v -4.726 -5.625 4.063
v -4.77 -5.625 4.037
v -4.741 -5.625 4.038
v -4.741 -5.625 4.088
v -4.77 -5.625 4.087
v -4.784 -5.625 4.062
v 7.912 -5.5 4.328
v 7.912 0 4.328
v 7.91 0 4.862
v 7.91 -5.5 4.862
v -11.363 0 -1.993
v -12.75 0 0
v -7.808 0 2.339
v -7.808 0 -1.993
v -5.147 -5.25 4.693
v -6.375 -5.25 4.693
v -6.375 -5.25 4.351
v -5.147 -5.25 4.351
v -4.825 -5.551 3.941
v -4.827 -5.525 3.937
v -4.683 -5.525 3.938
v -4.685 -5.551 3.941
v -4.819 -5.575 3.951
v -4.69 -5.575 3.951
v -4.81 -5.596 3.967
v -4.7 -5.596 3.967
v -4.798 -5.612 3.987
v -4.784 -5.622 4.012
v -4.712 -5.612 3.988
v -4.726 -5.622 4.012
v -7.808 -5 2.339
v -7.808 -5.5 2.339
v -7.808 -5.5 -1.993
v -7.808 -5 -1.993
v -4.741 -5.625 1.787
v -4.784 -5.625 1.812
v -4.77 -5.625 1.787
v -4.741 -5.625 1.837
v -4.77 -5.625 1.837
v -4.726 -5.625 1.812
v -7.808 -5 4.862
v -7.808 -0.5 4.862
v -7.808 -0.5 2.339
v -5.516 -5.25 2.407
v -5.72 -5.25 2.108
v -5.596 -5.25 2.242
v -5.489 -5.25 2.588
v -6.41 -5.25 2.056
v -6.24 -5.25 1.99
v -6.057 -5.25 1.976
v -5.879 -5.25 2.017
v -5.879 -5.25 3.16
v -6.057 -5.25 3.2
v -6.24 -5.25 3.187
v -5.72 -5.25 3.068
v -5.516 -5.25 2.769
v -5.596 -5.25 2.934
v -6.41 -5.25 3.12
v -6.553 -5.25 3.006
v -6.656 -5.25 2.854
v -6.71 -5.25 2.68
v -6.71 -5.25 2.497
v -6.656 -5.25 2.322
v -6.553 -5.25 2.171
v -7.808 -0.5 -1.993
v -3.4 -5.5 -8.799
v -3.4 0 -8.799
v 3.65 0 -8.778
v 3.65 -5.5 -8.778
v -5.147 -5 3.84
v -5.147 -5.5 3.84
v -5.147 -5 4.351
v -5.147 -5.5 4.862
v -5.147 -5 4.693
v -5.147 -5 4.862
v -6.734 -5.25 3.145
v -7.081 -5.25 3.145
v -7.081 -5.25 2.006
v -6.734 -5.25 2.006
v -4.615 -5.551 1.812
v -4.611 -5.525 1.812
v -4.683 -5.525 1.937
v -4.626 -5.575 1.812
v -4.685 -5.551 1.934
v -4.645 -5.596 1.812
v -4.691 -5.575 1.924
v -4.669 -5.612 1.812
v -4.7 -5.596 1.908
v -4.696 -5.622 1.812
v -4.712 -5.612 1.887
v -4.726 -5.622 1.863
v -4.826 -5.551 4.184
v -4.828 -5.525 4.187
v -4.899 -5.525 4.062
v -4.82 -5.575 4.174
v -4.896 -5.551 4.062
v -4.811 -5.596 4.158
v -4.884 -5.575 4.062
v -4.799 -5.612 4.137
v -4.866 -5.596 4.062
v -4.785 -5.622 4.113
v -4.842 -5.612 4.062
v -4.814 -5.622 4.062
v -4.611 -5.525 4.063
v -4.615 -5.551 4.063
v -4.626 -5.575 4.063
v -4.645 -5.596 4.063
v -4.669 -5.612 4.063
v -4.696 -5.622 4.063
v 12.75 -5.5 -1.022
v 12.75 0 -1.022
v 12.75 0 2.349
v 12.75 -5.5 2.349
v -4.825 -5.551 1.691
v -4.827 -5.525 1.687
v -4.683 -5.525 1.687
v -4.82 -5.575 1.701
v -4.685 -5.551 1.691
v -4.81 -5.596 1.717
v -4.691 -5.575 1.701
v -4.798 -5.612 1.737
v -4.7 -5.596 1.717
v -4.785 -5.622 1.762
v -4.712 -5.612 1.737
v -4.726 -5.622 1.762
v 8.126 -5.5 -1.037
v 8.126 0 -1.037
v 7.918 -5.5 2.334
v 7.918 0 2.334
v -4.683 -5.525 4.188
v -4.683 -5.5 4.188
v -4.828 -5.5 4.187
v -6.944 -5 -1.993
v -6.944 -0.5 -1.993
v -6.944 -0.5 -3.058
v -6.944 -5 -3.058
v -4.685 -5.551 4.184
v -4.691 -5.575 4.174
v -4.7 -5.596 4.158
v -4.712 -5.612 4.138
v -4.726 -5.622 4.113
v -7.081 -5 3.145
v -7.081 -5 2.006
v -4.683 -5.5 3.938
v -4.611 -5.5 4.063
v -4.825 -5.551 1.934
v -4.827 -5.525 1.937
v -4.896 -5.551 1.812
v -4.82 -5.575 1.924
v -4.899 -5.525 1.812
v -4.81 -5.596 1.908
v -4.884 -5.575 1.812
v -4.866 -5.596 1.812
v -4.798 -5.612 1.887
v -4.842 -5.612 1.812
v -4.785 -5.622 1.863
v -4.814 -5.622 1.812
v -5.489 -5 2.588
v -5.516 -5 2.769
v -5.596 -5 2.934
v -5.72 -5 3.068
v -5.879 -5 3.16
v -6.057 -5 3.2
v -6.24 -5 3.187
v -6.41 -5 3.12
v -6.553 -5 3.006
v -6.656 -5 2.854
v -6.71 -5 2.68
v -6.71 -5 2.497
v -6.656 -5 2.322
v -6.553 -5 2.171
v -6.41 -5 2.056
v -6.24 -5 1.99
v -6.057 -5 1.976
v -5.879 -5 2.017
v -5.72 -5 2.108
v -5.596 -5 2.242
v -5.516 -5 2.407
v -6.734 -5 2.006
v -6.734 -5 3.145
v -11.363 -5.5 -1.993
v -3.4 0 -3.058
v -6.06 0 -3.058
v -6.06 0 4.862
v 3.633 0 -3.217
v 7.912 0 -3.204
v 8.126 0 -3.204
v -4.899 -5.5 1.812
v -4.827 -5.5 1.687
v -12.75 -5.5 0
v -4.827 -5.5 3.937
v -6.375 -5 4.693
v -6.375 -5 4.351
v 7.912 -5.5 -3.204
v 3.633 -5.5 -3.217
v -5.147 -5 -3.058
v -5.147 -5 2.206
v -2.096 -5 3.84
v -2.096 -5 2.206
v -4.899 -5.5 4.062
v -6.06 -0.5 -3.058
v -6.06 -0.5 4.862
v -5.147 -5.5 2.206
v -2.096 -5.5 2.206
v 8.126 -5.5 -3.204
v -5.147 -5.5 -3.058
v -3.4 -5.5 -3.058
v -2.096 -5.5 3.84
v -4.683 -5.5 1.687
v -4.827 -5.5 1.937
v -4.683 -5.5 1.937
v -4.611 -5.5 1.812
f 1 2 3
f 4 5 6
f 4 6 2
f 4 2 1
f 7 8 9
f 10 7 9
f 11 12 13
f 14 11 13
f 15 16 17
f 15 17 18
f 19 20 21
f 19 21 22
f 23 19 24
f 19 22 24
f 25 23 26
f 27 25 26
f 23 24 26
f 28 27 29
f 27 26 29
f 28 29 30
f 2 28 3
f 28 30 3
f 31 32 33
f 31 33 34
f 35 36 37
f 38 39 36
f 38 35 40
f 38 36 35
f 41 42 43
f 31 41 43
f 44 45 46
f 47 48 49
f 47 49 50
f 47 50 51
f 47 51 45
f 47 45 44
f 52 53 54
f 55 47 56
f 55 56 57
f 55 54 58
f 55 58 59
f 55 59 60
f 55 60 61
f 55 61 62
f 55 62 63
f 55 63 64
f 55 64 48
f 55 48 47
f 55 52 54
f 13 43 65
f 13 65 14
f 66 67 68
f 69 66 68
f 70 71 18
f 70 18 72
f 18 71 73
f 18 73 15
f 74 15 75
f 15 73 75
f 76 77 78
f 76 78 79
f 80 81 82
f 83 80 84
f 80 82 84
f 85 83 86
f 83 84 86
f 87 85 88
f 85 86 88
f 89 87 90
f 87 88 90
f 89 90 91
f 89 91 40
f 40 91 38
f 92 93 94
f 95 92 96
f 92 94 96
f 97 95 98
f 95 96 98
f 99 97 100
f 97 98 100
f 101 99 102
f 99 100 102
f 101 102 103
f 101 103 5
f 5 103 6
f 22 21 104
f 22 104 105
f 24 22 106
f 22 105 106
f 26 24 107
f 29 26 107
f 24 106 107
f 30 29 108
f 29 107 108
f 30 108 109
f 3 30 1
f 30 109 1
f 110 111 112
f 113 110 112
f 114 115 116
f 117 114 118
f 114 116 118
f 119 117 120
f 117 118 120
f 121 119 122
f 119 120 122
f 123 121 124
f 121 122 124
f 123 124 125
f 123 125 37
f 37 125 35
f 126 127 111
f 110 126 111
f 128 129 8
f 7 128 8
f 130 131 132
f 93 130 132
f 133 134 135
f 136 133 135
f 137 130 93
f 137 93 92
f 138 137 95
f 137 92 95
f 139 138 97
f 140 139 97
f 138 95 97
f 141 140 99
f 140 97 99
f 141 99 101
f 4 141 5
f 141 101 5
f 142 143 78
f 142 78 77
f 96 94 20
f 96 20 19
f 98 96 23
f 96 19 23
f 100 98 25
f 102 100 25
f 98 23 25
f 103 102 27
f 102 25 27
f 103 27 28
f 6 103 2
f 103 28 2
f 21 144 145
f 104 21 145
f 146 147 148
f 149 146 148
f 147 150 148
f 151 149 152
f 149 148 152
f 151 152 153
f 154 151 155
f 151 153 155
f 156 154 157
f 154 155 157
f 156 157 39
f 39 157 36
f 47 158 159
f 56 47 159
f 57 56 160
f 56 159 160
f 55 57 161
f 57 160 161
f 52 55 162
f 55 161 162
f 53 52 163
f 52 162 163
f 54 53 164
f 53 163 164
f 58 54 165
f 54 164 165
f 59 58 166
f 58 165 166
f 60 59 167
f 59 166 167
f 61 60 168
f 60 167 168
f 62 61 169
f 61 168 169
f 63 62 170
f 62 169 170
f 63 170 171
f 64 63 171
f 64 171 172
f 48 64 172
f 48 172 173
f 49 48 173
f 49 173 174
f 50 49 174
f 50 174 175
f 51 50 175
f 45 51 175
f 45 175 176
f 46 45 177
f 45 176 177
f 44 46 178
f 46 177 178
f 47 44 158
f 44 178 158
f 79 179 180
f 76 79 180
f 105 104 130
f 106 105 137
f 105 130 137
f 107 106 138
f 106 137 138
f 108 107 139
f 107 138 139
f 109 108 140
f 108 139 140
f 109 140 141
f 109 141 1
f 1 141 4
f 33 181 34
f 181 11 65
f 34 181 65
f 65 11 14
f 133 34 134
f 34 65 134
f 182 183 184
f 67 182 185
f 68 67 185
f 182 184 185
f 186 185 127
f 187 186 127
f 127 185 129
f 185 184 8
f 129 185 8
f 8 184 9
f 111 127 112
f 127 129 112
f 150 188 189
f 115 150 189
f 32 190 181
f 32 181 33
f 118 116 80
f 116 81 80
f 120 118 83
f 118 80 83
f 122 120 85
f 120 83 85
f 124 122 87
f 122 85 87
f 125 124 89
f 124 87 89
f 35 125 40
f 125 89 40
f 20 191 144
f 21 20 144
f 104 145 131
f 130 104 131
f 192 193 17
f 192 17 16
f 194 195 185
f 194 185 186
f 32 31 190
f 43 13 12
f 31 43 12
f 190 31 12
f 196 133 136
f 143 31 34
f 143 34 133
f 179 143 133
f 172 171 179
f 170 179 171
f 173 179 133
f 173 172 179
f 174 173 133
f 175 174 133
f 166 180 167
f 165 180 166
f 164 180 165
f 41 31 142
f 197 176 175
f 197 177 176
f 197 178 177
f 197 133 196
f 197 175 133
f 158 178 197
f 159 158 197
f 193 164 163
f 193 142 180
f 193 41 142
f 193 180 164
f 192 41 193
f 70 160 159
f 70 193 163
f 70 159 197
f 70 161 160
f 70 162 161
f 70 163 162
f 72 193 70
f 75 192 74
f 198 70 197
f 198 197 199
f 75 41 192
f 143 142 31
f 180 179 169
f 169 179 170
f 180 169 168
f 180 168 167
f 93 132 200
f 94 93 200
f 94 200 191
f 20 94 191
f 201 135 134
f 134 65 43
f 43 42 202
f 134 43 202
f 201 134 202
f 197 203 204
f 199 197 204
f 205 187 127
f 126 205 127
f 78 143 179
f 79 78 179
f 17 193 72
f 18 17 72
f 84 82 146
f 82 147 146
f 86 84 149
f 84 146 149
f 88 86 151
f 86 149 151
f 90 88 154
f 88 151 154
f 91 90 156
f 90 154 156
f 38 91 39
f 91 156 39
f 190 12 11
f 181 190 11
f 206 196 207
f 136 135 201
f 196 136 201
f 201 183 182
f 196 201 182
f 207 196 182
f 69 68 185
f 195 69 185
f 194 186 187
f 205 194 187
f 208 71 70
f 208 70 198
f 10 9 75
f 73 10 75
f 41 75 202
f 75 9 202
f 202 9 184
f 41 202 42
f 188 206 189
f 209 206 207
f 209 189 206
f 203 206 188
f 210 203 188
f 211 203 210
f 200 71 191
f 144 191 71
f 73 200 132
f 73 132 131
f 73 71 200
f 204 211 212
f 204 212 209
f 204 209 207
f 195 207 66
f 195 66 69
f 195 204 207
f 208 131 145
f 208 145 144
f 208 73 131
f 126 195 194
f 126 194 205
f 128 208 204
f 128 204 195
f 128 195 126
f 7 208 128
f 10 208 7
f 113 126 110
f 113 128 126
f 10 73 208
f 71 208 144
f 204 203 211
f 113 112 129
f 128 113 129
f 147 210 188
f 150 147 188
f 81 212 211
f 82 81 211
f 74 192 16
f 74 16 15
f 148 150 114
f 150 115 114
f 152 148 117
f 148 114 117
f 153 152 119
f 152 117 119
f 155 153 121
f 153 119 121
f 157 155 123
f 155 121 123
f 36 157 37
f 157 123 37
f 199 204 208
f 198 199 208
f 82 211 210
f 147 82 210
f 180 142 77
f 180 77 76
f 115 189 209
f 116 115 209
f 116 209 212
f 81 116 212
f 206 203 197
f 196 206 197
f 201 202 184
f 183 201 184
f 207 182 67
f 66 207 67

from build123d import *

# Parameters (mm, degrees)
F1_DEPTH = 5.5
F2_W     = 1.747264
F2_H     = 0.5
F2_W_2   = 2.660204
F3_DEPTH = 25
F4_W     = 3.051504
F4_H     = 1.634434
F5_DEPTH = 0.5
F6_R     = 0.613882
F6_W     = 0.346699
F6_H     = 1.139151
F6_W_2   = 1.22809
F6_H_2   = 0.341659
F7_DEPTH = 0.25
F9_DEPTH = 0.125
F10_R    = 0.1


with BuildPart() as f1:
    # F0 (on Front) → F1 (new body)
    with BuildSketch(Plane.XZ):
        Polygon((-7.807526, 2.338965), (-12.75, 0), (-11.363133, -1.99297), (-6.944289, -1.99297), (-6.944289, -3.057505), (-3.40048, -3.057505), (-3.40048, -8.799218), (3.6498, -8.777764), (3.63288, -3.217265), (7.91198, -3.204243), (8.126297, -3.204243), (8.126297, -1.036535), (12.75, -1.022465), (12.75, 2.348977), (7.918047, 2.334274), (7.91198, 4.327958), (7.910354, 4.862492), (6.47919, 4.862492), (-7.807526, 4.862492), (-7.807526, 3.205703), align=None)
    extrude(amount=F1_DEPTH)

    # F2 (on face) → F3 (cut)
    with BuildSketch(Plane.XY.offset(4.862492)):
        with Locations((-6.933894, -0.25)):
            Rectangle(F2_W, F2_H)
        with Locations((-6.477424, -5.25)):
            Rectangle(F2_W_2, F2_H)
    extrude(amount=-F3_DEPTH, mode=Mode.SUBTRACT)

    # F4 (on face) → F5 (cut)
    with BuildSketch(Plane.XZ.offset(5.5)):
        with Locations((-3.62157, 3.023124)):
            Rectangle(F4_W, F4_H)
    extrude(amount=-F5_DEPTH, mode=Mode.SUBTRACT)

    # F6 (on face) → F7 (join)
    with BuildSketch(Plane.XZ.offset(5)):
        with Locations((-6.103006, 2.588122)):
            Circle(F6_R)
        with Locations((-6.90784, 2.57574)):
            Rectangle(F6_W, F6_H)
        with Locations((-5.761367, 4.522246)):
            Rectangle(F6_W_2, F6_H_2)
    extrude(amount=F7_DEPTH)

    # F8 (on face) → F9 (join)
    with BuildSketch(Plane.XZ.offset(5.5)):
        Polygon((-4.826936, 3.937273), (-4.682599, 3.937712), (-4.610811, 4.062931), (-4.68336, 4.187711), (-4.827697, 4.187272), (-4.899485, 4.062053), align=None)
        Polygon((-4.827317, 1.687492), (-4.682979, 1.687492), (-4.61081, 1.812492), (-4.682979, 1.937492), (-4.827317, 1.937492), (-4.899485, 1.812492), align=None)
    extrude(amount=F9_DEPTH)

    # F10
    f10_edges = [f1.edges().sort_by_distance(p)[0] for p in [
        (-4.863591, -5.625, 4.124663),
        (-4.86321, -5.625, 3.999663),
        (-4.754767, -5.625, 3.937493),
        (-4.647085, -5.625, 4.125321),
        (-4.755528, -5.625, 4.187492),
        (-4.646705, -5.625, 4.000322),
        (-4.755148, -5.625, 1.937492),
        (-4.646895, -5.625, 1.874992),
        (-4.646895, -5.625, 1.749992),
        (-4.755148, -5.625, 1.687492),
        (-4.863401, -5.625, 1.749992),
        (-4.863401, -5.625, 1.874992),
    ]]
    fillet(f10_edges, radius=F10_R)


solid = f1.part
